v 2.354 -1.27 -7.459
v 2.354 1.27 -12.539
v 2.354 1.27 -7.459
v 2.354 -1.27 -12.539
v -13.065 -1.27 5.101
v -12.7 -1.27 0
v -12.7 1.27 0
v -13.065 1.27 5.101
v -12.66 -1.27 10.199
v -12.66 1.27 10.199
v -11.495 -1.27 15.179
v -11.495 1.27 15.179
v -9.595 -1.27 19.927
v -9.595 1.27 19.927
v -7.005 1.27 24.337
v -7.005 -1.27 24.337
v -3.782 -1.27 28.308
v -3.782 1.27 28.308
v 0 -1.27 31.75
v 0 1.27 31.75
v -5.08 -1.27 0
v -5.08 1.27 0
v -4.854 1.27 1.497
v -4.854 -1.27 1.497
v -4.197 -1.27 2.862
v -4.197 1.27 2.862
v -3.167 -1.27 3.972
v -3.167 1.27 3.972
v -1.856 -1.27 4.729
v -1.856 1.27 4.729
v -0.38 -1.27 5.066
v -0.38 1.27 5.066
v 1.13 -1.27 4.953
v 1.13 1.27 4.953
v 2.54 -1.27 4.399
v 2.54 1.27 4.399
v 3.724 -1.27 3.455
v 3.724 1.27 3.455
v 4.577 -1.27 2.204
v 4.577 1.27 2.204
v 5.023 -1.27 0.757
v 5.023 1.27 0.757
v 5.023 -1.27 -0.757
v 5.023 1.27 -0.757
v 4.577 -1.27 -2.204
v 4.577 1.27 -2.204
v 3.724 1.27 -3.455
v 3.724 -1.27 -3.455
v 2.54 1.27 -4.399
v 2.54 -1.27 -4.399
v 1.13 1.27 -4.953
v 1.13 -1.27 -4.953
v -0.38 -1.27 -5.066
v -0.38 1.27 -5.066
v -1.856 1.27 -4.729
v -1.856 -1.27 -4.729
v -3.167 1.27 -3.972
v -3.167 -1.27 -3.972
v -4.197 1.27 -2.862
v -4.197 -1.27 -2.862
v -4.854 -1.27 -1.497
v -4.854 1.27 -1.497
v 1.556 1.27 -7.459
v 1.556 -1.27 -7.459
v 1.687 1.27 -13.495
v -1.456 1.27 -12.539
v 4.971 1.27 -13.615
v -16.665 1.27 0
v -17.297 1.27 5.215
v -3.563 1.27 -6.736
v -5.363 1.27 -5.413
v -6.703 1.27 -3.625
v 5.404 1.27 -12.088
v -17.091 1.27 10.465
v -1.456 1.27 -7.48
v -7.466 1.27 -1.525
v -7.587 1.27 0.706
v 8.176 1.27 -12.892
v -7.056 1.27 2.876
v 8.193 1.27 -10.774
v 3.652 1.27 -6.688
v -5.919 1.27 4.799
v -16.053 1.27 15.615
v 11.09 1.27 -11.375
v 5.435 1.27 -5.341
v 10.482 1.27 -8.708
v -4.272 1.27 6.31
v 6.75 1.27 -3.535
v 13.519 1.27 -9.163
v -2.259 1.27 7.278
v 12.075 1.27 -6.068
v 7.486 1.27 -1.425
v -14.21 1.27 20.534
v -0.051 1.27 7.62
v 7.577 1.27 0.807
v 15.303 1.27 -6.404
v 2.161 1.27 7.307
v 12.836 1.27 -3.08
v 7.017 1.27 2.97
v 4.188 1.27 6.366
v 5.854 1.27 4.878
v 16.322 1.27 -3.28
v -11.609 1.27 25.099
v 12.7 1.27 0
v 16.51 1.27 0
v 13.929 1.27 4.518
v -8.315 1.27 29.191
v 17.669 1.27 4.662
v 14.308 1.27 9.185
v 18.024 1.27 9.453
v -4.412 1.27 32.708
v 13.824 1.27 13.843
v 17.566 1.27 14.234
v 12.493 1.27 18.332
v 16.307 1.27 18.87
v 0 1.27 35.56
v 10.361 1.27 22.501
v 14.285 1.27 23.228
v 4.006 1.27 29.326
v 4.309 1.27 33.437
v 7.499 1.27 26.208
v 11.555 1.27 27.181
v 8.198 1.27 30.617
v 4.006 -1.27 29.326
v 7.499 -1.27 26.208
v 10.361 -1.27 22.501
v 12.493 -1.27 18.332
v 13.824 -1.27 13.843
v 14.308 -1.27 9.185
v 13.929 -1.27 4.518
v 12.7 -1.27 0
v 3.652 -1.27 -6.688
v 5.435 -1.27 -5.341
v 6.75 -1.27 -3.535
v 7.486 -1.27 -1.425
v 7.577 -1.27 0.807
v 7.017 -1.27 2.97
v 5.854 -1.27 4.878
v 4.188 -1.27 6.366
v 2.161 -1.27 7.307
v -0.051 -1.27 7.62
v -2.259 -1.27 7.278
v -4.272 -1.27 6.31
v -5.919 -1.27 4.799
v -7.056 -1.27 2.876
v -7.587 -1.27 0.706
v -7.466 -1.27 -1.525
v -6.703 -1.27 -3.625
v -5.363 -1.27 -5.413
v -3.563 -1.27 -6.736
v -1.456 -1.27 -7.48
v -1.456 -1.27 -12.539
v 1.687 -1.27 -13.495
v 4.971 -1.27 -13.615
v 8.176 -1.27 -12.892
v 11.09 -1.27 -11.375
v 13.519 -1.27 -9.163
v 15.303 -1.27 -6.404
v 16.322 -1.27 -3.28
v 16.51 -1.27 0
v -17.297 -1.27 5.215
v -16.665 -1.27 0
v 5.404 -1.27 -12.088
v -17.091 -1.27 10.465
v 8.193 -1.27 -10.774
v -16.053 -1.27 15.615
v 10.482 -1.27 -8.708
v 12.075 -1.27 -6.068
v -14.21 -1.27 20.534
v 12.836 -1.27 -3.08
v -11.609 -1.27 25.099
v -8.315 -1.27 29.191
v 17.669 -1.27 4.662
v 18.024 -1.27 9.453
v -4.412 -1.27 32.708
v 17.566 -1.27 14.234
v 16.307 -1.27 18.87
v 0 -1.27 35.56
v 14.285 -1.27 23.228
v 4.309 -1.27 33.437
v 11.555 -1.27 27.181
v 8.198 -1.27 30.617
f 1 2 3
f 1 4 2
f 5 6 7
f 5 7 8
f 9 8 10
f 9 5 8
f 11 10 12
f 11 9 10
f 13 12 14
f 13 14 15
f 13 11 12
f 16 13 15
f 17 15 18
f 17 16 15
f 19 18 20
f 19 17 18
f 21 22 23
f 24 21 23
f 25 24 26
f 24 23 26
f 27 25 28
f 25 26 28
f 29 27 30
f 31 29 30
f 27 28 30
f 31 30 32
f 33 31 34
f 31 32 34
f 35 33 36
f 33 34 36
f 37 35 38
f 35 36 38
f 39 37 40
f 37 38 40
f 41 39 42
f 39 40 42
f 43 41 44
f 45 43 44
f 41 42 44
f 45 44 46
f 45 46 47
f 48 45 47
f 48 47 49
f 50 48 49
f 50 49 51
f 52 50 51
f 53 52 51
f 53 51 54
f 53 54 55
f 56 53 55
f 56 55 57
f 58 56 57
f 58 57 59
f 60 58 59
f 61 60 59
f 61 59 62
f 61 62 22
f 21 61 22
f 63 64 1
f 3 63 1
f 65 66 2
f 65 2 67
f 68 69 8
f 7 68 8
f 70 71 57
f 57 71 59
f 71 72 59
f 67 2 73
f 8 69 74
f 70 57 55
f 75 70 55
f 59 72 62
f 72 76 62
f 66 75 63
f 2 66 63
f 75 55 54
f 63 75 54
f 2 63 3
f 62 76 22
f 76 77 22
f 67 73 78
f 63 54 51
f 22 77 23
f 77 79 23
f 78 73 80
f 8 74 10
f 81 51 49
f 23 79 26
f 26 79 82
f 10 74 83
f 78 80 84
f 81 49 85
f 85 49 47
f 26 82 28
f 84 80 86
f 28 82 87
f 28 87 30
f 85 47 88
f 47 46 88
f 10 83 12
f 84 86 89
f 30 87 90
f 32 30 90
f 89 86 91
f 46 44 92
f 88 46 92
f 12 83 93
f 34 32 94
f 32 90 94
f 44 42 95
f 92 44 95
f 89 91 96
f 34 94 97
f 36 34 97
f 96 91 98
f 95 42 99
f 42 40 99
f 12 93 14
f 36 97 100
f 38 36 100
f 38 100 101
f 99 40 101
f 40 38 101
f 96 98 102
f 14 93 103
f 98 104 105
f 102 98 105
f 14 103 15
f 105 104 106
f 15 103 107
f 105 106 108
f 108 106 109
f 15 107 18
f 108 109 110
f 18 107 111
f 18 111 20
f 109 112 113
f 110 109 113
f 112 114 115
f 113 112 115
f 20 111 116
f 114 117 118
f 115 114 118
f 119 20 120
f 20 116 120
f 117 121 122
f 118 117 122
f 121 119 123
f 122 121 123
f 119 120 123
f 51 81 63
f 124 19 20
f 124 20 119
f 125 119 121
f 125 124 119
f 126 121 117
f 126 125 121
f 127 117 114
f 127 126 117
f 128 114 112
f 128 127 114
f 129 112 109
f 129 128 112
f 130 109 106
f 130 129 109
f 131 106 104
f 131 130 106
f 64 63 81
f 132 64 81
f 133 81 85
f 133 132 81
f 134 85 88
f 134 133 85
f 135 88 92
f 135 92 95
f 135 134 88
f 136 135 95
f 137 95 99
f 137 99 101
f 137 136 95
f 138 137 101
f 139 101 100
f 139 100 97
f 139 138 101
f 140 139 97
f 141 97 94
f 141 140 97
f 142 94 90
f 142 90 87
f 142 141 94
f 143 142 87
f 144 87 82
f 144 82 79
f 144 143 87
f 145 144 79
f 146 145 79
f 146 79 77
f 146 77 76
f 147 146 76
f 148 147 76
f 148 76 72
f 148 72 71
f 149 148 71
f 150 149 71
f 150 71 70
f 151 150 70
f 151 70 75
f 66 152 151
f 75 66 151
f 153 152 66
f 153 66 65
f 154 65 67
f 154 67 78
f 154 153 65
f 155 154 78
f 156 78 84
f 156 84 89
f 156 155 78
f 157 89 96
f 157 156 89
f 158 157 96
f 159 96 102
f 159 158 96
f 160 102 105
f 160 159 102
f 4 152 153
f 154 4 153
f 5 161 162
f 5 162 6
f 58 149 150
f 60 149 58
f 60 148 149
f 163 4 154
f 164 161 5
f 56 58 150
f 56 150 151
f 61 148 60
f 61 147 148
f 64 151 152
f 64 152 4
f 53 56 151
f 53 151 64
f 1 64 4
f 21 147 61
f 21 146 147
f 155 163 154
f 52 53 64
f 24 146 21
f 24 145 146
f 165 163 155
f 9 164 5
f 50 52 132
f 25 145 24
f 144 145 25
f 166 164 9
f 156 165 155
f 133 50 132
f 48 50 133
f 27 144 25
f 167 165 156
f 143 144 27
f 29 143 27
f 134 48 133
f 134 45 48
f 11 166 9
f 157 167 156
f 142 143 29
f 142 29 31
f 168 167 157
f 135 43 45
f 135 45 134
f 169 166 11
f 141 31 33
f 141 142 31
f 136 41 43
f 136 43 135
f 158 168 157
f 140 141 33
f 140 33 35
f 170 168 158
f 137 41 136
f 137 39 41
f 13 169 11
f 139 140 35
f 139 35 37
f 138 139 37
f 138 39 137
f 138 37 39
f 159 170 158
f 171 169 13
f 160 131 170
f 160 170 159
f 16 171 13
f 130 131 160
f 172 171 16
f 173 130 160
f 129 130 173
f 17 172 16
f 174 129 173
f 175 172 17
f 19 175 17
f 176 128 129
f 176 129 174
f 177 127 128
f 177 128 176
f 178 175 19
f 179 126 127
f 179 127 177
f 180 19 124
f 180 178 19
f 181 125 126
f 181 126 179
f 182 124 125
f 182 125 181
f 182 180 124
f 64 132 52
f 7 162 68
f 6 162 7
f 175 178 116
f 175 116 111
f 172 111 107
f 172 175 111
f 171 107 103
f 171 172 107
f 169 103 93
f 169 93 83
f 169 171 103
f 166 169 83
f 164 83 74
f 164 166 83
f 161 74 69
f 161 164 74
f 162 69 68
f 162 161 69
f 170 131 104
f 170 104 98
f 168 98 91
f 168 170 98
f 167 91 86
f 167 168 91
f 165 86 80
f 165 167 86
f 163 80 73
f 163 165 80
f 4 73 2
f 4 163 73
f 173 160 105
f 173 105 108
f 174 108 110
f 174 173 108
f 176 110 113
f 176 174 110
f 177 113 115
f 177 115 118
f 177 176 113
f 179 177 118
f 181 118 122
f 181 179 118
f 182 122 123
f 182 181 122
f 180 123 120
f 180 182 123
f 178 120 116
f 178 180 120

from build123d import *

# Parameters (mm, degrees)
F0_R     = 7.62
F1_DEPTH = 1.27
F3_D     = 10.16
F4_W     = 3.81
F4_H     = 5.08
F5_DEPTH = 1.27


with BuildPart() as f1:
    # F0 (on Front) → F1 (new body, symmetric)
    with BuildSketch(Plane.XZ):
        Circle(F0_R)
    extrude(amount=F1_DEPTH, both=True)

    # F3 (through all)
    with Locations(Plane.XZ.offset(1.27)):
        with Locations((0, 0)):
            Hole(F3_D / 2)

    # F4 (on Front) → F5 (join, symmetric)
    with BuildSketch(Plane.XZ):
        with Locations((0.448802, -9.999485)):
            Rectangle(F4_W, F4_H)
        with BuildLine():
            Line((2.353802, -12.539485), (-1.456198, -12.539485))
            ThreePointArc((-1.456198, -12.539485), (11.08983, -11.3746), (16.51, 0))
            ThreePointArc((16.51, 0), (15.388414, 21.091942), (0, 35.56))
            ThreePointArc((0, 35.56), (-14.210098, 20.534478), (-16.665379, 0))
            Line((-16.665379, 0), (-12.7, 0))
            ThreePointArc((-12.7, 0), (-10.634561, 17.588824), (0, 31.75))
            ThreePointArc((0, 31.75), (12.493217, 18.332287), (12.7, 0))
            ThreePointArc((12.7, 0), (10.482185, -8.708117), (2.353802, -12.539485))
        make_face()
    extrude(amount=F5_DEPTH, both=True)


solid = f1.part
